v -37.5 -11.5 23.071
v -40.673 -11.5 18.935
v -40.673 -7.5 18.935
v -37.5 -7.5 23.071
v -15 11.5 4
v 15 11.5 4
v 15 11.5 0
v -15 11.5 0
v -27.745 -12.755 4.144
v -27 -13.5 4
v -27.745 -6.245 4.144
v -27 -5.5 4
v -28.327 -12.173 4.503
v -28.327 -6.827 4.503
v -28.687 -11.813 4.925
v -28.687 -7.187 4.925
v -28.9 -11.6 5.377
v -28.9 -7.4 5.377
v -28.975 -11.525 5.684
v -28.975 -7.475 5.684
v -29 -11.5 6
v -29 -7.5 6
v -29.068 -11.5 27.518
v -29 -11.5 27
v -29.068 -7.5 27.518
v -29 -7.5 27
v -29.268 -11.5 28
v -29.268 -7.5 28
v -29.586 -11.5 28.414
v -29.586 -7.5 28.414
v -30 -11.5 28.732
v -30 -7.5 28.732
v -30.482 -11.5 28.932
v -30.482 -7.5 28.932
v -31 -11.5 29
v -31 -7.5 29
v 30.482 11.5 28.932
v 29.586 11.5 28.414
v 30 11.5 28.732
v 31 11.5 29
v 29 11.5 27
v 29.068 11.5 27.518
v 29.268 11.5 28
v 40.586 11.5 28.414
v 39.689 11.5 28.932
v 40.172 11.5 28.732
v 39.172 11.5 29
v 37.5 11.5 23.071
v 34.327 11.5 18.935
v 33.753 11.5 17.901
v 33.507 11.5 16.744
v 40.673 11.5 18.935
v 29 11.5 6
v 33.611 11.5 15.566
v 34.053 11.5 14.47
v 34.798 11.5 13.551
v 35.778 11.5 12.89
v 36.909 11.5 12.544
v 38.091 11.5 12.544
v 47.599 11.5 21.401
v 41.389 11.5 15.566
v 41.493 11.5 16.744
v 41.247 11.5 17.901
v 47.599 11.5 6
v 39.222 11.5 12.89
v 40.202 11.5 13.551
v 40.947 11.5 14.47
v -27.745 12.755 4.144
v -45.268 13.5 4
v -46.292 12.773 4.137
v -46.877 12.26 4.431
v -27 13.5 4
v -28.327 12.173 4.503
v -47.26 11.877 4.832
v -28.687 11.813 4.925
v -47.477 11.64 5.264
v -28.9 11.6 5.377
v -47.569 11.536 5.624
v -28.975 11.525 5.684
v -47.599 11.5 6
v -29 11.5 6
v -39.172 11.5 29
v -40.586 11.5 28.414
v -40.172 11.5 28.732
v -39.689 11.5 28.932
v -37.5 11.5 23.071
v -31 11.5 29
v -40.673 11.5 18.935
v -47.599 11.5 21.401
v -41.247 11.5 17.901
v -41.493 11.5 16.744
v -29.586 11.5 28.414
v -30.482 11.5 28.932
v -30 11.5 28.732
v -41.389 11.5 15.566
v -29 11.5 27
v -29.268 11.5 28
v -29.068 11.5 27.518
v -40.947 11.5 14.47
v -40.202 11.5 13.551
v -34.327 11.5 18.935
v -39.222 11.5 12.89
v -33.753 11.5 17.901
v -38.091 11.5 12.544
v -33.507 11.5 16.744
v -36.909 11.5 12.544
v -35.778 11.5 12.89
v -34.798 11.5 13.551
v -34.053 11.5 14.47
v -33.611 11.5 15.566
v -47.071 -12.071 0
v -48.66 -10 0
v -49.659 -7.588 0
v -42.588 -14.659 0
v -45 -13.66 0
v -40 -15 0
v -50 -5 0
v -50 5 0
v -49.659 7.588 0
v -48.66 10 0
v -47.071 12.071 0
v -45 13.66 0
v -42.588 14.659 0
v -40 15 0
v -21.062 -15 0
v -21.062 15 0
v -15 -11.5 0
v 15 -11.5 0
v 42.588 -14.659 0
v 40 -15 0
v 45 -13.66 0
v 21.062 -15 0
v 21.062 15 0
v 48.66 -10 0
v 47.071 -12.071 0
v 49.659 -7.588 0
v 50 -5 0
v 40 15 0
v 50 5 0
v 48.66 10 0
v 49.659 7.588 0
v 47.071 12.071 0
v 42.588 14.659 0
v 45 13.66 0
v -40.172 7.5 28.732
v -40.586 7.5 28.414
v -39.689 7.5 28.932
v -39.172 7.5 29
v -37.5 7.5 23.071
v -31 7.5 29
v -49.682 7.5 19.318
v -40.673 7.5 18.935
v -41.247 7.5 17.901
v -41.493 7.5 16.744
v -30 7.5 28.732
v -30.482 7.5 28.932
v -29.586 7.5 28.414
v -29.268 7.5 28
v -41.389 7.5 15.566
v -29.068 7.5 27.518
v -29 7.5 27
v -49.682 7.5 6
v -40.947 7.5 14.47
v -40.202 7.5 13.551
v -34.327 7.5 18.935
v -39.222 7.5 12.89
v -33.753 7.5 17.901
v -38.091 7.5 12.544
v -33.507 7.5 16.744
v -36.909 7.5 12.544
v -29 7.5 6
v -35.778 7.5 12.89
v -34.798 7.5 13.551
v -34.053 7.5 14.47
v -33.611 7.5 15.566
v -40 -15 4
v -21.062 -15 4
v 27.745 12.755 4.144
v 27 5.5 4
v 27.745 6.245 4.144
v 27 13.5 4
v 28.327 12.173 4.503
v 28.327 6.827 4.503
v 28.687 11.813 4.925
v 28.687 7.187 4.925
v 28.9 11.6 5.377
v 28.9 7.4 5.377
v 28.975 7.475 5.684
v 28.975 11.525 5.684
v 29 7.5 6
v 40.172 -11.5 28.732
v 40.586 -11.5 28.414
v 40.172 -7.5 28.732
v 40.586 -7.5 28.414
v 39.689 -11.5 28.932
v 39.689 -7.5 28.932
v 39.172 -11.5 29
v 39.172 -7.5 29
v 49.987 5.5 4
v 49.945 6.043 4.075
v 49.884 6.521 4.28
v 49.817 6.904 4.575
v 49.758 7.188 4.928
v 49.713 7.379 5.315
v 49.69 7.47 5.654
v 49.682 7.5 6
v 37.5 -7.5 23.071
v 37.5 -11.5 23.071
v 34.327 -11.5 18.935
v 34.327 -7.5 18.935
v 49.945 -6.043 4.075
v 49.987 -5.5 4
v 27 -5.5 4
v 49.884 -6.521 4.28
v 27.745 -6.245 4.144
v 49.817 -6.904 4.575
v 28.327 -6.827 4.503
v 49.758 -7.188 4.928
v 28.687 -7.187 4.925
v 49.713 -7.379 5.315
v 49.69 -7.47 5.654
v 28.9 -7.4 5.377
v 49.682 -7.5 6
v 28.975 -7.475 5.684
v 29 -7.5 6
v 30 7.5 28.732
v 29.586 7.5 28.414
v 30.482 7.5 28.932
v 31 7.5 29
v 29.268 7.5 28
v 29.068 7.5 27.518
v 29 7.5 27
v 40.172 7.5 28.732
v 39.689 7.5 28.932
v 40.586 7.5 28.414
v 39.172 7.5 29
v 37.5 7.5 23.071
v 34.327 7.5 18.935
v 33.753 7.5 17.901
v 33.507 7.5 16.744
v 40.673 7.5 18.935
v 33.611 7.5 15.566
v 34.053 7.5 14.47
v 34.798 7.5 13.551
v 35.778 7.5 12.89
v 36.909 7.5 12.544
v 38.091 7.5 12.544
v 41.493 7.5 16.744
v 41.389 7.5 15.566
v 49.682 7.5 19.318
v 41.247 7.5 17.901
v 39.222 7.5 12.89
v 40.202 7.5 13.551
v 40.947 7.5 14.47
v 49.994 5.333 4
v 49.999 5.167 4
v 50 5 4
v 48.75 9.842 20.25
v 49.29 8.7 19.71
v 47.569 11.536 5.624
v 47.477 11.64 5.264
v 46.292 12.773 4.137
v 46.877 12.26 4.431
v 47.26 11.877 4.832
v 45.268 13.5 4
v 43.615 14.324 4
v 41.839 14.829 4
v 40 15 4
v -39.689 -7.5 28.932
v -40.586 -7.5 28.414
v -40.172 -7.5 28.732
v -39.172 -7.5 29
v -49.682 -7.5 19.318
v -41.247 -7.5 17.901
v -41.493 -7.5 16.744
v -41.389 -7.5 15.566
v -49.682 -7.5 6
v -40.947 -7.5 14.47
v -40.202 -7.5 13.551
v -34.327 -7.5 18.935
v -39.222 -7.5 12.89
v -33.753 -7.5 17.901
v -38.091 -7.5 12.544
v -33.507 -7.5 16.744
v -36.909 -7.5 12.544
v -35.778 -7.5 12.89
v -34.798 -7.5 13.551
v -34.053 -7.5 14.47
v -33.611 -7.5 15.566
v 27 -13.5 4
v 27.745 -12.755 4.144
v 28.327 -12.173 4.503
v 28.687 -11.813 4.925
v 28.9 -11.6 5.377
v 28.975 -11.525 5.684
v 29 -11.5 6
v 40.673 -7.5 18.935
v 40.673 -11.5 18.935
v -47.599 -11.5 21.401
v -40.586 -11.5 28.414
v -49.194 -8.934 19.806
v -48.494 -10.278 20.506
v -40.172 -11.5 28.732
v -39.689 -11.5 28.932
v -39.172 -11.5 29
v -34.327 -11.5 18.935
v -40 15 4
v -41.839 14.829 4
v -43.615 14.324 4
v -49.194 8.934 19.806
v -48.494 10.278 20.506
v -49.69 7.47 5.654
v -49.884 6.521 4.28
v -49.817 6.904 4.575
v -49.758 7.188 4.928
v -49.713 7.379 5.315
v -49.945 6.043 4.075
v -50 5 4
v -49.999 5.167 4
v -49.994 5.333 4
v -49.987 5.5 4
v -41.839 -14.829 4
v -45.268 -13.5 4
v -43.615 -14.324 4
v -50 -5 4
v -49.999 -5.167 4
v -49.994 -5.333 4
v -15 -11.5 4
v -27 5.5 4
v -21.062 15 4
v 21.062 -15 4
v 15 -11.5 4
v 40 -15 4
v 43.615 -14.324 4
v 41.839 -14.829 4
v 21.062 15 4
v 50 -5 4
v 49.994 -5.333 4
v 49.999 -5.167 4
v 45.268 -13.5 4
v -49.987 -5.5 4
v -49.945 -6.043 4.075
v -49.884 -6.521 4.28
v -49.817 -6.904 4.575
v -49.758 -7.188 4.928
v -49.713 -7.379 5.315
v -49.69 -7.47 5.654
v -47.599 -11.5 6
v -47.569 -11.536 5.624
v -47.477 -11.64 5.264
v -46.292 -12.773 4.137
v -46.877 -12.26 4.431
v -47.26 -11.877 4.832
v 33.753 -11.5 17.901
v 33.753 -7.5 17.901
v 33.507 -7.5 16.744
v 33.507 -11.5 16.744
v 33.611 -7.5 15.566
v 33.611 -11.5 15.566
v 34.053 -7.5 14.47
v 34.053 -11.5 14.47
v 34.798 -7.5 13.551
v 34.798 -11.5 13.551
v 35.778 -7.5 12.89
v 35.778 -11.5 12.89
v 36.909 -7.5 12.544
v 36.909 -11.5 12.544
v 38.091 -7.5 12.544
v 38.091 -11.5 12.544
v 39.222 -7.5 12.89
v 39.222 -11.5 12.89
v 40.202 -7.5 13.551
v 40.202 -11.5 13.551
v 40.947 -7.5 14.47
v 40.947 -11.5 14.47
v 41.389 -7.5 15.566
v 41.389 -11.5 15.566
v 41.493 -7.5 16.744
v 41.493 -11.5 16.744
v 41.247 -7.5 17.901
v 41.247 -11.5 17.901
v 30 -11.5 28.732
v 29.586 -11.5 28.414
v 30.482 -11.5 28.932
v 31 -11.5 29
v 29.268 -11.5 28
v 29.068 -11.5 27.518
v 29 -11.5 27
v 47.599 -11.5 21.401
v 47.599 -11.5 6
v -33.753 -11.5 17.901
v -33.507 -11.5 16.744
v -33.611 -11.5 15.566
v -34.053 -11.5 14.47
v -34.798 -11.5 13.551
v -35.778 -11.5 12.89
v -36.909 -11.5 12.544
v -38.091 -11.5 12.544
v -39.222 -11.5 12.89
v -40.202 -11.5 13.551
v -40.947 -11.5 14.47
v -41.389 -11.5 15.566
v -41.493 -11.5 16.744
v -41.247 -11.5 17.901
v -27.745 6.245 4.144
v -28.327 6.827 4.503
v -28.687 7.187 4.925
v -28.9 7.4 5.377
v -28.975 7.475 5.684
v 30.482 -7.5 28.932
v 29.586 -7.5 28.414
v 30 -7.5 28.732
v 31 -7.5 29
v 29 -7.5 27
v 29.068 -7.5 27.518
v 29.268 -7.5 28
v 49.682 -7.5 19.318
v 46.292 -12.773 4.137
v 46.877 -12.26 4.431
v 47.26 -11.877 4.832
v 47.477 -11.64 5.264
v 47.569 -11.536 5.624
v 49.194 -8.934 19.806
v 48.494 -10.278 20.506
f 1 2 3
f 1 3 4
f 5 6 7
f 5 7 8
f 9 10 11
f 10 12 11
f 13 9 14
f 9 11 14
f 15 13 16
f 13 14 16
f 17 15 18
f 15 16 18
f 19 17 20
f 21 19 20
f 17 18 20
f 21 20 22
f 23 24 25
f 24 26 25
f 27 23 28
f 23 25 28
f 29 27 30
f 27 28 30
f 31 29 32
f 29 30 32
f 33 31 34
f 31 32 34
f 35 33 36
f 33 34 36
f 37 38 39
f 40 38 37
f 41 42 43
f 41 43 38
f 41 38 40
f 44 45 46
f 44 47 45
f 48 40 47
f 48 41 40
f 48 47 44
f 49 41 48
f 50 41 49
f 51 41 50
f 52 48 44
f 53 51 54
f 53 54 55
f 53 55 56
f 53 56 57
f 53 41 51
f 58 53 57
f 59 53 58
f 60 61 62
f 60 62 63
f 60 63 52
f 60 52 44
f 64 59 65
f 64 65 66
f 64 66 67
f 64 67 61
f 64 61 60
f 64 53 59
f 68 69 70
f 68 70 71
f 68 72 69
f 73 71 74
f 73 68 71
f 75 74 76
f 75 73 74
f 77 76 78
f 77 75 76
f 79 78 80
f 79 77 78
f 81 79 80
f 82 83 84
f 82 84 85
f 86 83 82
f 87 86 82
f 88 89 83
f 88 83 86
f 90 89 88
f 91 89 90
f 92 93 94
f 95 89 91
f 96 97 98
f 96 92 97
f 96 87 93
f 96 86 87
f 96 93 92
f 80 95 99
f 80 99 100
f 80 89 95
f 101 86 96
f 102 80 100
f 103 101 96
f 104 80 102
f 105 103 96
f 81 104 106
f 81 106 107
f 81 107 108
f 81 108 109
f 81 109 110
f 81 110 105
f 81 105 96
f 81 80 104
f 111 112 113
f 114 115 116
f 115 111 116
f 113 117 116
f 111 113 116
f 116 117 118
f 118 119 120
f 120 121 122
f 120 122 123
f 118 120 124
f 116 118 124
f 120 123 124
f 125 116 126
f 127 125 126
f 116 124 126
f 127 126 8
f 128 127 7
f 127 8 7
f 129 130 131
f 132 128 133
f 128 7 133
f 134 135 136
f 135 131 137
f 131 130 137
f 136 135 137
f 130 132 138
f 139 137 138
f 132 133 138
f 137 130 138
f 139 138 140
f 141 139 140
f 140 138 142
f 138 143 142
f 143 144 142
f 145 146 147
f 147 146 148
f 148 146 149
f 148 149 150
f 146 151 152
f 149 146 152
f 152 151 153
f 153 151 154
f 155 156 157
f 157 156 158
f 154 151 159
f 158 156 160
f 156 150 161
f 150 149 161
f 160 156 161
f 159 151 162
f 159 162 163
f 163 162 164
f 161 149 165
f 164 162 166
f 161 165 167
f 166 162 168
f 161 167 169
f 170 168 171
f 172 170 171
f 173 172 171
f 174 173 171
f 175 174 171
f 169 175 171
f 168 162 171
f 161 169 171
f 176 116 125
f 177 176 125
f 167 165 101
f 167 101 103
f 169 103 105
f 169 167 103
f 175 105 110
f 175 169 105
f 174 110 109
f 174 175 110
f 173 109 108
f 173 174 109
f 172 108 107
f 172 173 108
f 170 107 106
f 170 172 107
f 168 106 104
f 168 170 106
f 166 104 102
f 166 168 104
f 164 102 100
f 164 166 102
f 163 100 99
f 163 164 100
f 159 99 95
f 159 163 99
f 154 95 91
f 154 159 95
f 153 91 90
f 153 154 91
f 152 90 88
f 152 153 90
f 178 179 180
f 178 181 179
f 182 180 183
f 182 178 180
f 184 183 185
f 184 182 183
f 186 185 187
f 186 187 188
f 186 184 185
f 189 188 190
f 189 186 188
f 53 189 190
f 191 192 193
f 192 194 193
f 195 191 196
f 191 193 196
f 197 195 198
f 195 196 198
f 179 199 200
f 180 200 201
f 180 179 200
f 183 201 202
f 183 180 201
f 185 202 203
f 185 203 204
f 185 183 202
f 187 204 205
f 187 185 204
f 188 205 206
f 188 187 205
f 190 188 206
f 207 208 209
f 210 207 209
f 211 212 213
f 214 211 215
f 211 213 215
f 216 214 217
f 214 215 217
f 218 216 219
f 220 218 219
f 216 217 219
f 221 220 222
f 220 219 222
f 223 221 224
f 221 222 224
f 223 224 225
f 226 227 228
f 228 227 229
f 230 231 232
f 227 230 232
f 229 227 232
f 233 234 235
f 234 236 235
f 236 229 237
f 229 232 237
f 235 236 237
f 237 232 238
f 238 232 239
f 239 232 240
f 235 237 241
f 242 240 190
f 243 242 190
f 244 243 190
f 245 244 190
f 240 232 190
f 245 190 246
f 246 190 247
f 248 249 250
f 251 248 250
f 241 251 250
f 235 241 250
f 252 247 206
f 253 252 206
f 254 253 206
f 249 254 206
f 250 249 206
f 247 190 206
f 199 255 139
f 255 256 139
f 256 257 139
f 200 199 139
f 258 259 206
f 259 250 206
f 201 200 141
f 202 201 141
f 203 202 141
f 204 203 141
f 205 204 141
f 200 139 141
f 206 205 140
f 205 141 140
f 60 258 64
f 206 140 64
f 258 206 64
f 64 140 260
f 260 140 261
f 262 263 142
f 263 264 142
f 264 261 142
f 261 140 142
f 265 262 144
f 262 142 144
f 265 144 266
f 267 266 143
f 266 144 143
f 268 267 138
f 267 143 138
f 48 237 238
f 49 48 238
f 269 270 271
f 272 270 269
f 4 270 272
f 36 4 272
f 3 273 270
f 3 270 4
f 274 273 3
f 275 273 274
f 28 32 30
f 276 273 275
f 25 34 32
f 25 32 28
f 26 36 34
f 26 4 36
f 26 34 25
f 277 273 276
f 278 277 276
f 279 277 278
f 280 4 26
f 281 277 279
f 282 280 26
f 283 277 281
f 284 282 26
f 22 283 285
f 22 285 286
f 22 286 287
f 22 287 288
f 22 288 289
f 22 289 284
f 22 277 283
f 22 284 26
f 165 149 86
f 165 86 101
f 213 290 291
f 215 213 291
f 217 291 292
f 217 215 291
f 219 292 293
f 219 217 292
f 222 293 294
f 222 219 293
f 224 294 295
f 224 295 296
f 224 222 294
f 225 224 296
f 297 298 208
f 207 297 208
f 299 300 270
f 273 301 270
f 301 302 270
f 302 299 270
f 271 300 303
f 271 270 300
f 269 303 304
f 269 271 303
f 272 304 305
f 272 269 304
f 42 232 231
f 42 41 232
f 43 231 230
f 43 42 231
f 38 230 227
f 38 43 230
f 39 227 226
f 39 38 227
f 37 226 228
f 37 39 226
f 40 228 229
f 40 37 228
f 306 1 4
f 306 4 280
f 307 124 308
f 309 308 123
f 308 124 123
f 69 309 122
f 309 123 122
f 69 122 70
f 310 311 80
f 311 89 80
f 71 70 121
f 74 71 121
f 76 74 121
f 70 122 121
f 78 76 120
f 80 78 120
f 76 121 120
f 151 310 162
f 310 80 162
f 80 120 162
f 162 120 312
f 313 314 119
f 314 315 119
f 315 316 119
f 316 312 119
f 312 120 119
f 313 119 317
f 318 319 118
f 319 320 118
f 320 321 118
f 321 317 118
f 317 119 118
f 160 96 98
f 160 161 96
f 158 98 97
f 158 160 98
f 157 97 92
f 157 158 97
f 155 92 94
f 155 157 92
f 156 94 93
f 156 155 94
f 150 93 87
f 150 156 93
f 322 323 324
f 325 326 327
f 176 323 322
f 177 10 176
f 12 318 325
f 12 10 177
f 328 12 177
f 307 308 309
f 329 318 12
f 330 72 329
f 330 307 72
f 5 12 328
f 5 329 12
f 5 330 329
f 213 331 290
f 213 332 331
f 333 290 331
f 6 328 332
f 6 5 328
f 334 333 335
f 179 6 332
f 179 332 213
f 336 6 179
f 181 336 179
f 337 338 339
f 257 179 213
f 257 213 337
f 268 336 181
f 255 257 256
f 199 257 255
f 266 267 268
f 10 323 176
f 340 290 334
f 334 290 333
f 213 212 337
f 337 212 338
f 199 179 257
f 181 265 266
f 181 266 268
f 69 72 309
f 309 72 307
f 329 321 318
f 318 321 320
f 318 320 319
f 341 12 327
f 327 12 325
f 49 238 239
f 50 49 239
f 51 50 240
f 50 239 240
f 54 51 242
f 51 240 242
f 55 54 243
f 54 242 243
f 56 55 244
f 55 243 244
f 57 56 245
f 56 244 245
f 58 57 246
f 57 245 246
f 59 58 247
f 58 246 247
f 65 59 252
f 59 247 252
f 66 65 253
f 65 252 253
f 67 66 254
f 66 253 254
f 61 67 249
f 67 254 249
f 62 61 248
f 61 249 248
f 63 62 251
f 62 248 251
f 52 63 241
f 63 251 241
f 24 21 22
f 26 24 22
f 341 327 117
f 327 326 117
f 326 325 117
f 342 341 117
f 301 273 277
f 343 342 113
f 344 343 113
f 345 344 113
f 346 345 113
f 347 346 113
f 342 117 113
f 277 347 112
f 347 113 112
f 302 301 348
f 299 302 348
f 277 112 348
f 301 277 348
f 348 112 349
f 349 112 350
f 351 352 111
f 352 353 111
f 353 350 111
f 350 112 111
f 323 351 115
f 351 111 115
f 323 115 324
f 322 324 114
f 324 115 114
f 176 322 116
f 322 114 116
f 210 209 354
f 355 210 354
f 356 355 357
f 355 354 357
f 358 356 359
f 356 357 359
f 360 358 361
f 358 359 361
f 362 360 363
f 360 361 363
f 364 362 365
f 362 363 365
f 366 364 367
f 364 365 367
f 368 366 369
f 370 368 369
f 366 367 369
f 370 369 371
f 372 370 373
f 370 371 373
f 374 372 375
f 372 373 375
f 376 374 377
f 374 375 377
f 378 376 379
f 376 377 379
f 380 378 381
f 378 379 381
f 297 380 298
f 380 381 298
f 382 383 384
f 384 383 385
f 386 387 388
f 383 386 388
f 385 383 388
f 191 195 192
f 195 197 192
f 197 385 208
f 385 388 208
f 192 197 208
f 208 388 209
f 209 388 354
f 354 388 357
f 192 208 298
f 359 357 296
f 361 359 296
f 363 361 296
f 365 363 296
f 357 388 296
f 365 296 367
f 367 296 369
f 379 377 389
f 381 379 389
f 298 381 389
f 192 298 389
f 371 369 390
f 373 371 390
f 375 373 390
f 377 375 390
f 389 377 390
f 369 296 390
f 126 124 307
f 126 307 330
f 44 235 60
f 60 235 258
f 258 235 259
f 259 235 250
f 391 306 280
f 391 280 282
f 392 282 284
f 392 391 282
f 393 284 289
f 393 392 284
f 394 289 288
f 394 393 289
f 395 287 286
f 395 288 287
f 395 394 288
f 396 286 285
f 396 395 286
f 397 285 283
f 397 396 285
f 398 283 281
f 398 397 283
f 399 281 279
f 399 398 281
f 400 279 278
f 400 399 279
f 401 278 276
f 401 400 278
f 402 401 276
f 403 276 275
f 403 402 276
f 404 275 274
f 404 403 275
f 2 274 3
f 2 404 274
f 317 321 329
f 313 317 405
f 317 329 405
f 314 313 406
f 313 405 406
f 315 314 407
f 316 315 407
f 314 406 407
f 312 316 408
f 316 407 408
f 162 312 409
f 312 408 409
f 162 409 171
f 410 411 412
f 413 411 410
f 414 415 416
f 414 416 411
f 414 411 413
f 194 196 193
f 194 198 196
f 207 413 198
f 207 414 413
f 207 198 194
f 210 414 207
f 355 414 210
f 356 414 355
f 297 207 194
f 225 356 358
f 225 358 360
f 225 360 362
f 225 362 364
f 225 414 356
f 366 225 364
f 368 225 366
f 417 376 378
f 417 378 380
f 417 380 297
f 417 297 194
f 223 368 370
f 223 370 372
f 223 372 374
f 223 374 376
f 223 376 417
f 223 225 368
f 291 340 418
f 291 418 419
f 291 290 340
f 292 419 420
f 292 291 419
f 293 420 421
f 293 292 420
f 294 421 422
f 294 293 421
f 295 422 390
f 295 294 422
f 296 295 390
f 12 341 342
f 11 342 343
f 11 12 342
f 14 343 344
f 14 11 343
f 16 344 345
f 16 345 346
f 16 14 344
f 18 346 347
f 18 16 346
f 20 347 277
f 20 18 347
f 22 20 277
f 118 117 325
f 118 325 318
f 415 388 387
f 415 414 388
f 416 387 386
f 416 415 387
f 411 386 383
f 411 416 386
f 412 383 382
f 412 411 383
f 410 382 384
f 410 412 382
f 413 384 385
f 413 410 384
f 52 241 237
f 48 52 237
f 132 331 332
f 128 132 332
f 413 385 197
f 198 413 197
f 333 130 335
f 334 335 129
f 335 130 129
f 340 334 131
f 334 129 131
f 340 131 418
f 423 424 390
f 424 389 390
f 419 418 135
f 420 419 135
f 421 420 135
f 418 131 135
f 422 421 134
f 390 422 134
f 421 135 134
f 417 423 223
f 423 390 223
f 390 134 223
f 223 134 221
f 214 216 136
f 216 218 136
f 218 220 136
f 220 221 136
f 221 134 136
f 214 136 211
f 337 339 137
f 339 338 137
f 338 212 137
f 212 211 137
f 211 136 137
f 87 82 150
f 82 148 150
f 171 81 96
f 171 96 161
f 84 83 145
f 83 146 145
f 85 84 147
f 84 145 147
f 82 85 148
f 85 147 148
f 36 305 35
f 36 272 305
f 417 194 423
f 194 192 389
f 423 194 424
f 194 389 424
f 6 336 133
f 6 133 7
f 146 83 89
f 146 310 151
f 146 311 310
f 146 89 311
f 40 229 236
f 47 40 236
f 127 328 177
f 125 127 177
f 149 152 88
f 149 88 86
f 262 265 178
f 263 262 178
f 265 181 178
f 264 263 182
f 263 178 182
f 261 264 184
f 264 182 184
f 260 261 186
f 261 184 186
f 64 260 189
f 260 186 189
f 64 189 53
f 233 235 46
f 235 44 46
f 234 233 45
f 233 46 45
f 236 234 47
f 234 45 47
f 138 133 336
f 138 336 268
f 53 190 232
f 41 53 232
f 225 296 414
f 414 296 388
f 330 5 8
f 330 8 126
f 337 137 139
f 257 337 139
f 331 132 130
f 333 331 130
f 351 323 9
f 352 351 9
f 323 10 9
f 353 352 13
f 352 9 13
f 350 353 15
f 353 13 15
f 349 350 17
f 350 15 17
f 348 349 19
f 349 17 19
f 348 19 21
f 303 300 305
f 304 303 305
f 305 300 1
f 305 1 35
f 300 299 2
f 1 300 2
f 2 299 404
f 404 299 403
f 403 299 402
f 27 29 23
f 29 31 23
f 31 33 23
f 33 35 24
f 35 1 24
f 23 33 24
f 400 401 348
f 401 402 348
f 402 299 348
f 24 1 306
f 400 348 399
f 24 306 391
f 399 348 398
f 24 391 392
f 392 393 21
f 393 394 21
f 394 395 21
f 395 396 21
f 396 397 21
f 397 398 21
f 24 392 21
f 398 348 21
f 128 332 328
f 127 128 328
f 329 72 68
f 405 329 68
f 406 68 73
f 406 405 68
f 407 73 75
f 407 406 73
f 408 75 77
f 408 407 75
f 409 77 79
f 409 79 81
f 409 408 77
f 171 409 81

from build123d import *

# Parameters (mm, degrees)
SKETCH1_W                = 100
SKETCH1_H                = 30
BOSS_EXTRUDE1_DEPTH      = 4
SKETCH2_W                = 21
SKETCH2_H                = 4
BOSS_EXTRUDE2_DEPTH      = 25
CHAMFER1_SIZE            = 10
CHAMFER1_OF_MIRROR1_SIZE = 10
MIRROR2_START            = -11.5
MIRROR2_DEPTH            = 4
MIRROR2_START_2          = 7.5
MIRROR2_2_DEPTH          = 4
CUT_EXTRUDE1_DEPTH       = 64.586555183
FILLET1_R                = 10
FILLET2_R                = 2
CUT_EXTRUDE2_DEPTH       = 58.879184626


# Read off the part's stored shape, not the designer's step: Mirror2
with BuildPart() as part:
    # Sketch1 → Boss-Extrude1 (new body)
    with BuildSketch(Plane.XY):
        Rectangle(SKETCH1_W, SKETCH1_H)
    extrude(amount=BOSS_EXTRUDE1_DEPTH)

    # Sketch2 → Boss-Extrude2 (add)
    with BuildSketch(Plane.XY.offset(4)):
        with Locations((-39.5, -9.5)):
            Rectangle(SKETCH2_W, SKETCH2_H)
    boss_extrude2 = extrude(amount=BOSS_EXTRUDE2_DEPTH)

    # Chamfer1
    chamfer1_edges = [part.edges().sort_by_distance(p)[0] for p in [
        (-50, -9.5, 29),
    ]]
    chamfer(chamfer1_edges, length=CHAMFER1_SIZE)

    # Mirror1: Boss-Extrude2 across plane
    add(boss_extrude2.mirror(Plane.ZX))

    # Chamfer1 of Mirror1
    chamfer1_of_mirror1_edges = [part.edges().sort_by_distance(p)[0] for p in [
        (-50, 9.5, 29),
    ]]
    chamfer(chamfer1_of_mirror1_edges, length=CHAMFER1_OF_MIRROR1_SIZE)

    # Mirror2 outline → Mirror2 (add)
    with BuildSketch(Plane(origin=(0, 0, 0), x_dir=(1, 0, 0), z_dir=(0, 1, 0)).offset(MIRROR2_START)):
        Polygon((50, -19), (50, -4), (29, -4), (29, -29), (40, -29), align=None)
    extrude(amount=MIRROR2_DEPTH)

    # Mirror2 2 outline → Mirror2 2 (add)
    with BuildSketch(Plane(origin=(0, 0, 0), x_dir=(1, 0, 0), z_dir=(0, 1, 0)).offset(MIRROR2_START_2)):
        Polygon((50, -19), (50, -4), (29, -4), (29, -29), (40, -29), align=None)
    extrude(amount=MIRROR2_2_DEPTH)

    # Sketch3 → Cut-Extrude1 (cut, through all)
    with BuildSketch(Plane.XZ.offset(11.5)):
        with BuildLine():
            Line((-40.673413361, 18.935045716), (-37.5, 23.070718527))
            Line((-37.5, 23.070718527), (-34.326586639, 18.935045716))
            ThreePointArc((-34.326586639, 18.935045716), (-37.5, 12.5), (-40.673413361, 18.935045716))
        make_face()
    cut_extrude1 = extrude(amount=-CUT_EXTRUDE1_DEPTH, mode=Mode.SUBTRACT)

    # Mirror4: Cut-Extrude1 across plane
    add(cut_extrude1.mirror(Plane(origin=(0, 0, 0), x_dir=(0, 0, 1), z_dir=(1, 0, 0))), mode=Mode.SUBTRACT)

    # Fillet1
    # the kernel refuses this fillet: 10 mm, written as the material it takes off along each edge
    with BuildSketch(Plane(origin=(50, 15, -25), x_dir=(-1, 0, 0), z_dir=(0, 0, 1)), Plane(origin=(-50, 15, -25), x_dir=(0, -1, 0), z_dir=(0, 0, 1))) as fillet1_piece_1:
        with BuildLine():
            CenterArc((FILLET1_R, FILLET1_R), FILLET1_R, 180, 90)
            Line((0, FILLET1_R), (0, 0))
            Line((0, 0), (FILLET1_R, 0))
        make_face()
    extrude(amount=54, mode=Mode.SUBTRACT)
    with BuildSketch(Plane(origin=(50, -15, -25), x_dir=(-1, 0, 0), z_dir=(0, 0, 1)), Plane(origin=(-50, -15, -25), x_dir=(0, 1, 0), z_dir=(0, 0, 1))) as fillet1_piece_2:
        with BuildLine():
            CenterArc((FILLET1_R, -FILLET1_R), FILLET1_R, 90, 90)
            Line((0, -FILLET1_R), (0, 0))
            Line((0, 0), (FILLET1_R, 0))
        make_face()
    extrude(amount=54, mode=Mode.SUBTRACT)

    # Fillet2
    fillet2_edges = [part.edges().sort_by_distance(p)[0] for p in [
        (38.299671038, 11.5, 4),
        (-38.299671038, 11.5, 4),
        (-38.299671038, -11.5, 4),
        (38.299671038, -11.5, 4),
        (-29, -9.5, 4),
        (-39.341229183, -7.5, 4),
        (-29, -9.5, 29),
        (-40, -9.5, 29),
        (-29, 9.5, 29),
        (-29, 9.5, 4),
        (-39.341229183, 7.5, 4),
        (-40, 9.5, 29),
        (29, 9.5, 4),
        (39.341229183, 7.5, 4),
        (29, 9.5, 29),
        (40, 9.5, 29),
        (29, -9.5, 29),
        (29, -9.5, 4),
        (39.341229183, -7.5, 4),
        (40, -9.5, 29),
    ]]
    fillet(fillet2_edges, radius=FILLET2_R)

    # Sketch4 → Cut-Extrude2 (cut, through all)
    with BuildSketch(Plane.XY.offset(4)):
        Polygon((-15, 15), (15, 15), (21.062177826, 15), (15, 11.5), (-15, 11.5), (-21.062177826, 15), align=None)
    cut_extrude2 = extrude(amount=-CUT_EXTRUDE2_DEPTH, mode=Mode.SUBTRACT)

    # Mirror5: Cut-Extrude2 across plane
    add(cut_extrude2.mirror(Plane.ZX), mode=Mode.SUBTRACT)


solid = part.part
